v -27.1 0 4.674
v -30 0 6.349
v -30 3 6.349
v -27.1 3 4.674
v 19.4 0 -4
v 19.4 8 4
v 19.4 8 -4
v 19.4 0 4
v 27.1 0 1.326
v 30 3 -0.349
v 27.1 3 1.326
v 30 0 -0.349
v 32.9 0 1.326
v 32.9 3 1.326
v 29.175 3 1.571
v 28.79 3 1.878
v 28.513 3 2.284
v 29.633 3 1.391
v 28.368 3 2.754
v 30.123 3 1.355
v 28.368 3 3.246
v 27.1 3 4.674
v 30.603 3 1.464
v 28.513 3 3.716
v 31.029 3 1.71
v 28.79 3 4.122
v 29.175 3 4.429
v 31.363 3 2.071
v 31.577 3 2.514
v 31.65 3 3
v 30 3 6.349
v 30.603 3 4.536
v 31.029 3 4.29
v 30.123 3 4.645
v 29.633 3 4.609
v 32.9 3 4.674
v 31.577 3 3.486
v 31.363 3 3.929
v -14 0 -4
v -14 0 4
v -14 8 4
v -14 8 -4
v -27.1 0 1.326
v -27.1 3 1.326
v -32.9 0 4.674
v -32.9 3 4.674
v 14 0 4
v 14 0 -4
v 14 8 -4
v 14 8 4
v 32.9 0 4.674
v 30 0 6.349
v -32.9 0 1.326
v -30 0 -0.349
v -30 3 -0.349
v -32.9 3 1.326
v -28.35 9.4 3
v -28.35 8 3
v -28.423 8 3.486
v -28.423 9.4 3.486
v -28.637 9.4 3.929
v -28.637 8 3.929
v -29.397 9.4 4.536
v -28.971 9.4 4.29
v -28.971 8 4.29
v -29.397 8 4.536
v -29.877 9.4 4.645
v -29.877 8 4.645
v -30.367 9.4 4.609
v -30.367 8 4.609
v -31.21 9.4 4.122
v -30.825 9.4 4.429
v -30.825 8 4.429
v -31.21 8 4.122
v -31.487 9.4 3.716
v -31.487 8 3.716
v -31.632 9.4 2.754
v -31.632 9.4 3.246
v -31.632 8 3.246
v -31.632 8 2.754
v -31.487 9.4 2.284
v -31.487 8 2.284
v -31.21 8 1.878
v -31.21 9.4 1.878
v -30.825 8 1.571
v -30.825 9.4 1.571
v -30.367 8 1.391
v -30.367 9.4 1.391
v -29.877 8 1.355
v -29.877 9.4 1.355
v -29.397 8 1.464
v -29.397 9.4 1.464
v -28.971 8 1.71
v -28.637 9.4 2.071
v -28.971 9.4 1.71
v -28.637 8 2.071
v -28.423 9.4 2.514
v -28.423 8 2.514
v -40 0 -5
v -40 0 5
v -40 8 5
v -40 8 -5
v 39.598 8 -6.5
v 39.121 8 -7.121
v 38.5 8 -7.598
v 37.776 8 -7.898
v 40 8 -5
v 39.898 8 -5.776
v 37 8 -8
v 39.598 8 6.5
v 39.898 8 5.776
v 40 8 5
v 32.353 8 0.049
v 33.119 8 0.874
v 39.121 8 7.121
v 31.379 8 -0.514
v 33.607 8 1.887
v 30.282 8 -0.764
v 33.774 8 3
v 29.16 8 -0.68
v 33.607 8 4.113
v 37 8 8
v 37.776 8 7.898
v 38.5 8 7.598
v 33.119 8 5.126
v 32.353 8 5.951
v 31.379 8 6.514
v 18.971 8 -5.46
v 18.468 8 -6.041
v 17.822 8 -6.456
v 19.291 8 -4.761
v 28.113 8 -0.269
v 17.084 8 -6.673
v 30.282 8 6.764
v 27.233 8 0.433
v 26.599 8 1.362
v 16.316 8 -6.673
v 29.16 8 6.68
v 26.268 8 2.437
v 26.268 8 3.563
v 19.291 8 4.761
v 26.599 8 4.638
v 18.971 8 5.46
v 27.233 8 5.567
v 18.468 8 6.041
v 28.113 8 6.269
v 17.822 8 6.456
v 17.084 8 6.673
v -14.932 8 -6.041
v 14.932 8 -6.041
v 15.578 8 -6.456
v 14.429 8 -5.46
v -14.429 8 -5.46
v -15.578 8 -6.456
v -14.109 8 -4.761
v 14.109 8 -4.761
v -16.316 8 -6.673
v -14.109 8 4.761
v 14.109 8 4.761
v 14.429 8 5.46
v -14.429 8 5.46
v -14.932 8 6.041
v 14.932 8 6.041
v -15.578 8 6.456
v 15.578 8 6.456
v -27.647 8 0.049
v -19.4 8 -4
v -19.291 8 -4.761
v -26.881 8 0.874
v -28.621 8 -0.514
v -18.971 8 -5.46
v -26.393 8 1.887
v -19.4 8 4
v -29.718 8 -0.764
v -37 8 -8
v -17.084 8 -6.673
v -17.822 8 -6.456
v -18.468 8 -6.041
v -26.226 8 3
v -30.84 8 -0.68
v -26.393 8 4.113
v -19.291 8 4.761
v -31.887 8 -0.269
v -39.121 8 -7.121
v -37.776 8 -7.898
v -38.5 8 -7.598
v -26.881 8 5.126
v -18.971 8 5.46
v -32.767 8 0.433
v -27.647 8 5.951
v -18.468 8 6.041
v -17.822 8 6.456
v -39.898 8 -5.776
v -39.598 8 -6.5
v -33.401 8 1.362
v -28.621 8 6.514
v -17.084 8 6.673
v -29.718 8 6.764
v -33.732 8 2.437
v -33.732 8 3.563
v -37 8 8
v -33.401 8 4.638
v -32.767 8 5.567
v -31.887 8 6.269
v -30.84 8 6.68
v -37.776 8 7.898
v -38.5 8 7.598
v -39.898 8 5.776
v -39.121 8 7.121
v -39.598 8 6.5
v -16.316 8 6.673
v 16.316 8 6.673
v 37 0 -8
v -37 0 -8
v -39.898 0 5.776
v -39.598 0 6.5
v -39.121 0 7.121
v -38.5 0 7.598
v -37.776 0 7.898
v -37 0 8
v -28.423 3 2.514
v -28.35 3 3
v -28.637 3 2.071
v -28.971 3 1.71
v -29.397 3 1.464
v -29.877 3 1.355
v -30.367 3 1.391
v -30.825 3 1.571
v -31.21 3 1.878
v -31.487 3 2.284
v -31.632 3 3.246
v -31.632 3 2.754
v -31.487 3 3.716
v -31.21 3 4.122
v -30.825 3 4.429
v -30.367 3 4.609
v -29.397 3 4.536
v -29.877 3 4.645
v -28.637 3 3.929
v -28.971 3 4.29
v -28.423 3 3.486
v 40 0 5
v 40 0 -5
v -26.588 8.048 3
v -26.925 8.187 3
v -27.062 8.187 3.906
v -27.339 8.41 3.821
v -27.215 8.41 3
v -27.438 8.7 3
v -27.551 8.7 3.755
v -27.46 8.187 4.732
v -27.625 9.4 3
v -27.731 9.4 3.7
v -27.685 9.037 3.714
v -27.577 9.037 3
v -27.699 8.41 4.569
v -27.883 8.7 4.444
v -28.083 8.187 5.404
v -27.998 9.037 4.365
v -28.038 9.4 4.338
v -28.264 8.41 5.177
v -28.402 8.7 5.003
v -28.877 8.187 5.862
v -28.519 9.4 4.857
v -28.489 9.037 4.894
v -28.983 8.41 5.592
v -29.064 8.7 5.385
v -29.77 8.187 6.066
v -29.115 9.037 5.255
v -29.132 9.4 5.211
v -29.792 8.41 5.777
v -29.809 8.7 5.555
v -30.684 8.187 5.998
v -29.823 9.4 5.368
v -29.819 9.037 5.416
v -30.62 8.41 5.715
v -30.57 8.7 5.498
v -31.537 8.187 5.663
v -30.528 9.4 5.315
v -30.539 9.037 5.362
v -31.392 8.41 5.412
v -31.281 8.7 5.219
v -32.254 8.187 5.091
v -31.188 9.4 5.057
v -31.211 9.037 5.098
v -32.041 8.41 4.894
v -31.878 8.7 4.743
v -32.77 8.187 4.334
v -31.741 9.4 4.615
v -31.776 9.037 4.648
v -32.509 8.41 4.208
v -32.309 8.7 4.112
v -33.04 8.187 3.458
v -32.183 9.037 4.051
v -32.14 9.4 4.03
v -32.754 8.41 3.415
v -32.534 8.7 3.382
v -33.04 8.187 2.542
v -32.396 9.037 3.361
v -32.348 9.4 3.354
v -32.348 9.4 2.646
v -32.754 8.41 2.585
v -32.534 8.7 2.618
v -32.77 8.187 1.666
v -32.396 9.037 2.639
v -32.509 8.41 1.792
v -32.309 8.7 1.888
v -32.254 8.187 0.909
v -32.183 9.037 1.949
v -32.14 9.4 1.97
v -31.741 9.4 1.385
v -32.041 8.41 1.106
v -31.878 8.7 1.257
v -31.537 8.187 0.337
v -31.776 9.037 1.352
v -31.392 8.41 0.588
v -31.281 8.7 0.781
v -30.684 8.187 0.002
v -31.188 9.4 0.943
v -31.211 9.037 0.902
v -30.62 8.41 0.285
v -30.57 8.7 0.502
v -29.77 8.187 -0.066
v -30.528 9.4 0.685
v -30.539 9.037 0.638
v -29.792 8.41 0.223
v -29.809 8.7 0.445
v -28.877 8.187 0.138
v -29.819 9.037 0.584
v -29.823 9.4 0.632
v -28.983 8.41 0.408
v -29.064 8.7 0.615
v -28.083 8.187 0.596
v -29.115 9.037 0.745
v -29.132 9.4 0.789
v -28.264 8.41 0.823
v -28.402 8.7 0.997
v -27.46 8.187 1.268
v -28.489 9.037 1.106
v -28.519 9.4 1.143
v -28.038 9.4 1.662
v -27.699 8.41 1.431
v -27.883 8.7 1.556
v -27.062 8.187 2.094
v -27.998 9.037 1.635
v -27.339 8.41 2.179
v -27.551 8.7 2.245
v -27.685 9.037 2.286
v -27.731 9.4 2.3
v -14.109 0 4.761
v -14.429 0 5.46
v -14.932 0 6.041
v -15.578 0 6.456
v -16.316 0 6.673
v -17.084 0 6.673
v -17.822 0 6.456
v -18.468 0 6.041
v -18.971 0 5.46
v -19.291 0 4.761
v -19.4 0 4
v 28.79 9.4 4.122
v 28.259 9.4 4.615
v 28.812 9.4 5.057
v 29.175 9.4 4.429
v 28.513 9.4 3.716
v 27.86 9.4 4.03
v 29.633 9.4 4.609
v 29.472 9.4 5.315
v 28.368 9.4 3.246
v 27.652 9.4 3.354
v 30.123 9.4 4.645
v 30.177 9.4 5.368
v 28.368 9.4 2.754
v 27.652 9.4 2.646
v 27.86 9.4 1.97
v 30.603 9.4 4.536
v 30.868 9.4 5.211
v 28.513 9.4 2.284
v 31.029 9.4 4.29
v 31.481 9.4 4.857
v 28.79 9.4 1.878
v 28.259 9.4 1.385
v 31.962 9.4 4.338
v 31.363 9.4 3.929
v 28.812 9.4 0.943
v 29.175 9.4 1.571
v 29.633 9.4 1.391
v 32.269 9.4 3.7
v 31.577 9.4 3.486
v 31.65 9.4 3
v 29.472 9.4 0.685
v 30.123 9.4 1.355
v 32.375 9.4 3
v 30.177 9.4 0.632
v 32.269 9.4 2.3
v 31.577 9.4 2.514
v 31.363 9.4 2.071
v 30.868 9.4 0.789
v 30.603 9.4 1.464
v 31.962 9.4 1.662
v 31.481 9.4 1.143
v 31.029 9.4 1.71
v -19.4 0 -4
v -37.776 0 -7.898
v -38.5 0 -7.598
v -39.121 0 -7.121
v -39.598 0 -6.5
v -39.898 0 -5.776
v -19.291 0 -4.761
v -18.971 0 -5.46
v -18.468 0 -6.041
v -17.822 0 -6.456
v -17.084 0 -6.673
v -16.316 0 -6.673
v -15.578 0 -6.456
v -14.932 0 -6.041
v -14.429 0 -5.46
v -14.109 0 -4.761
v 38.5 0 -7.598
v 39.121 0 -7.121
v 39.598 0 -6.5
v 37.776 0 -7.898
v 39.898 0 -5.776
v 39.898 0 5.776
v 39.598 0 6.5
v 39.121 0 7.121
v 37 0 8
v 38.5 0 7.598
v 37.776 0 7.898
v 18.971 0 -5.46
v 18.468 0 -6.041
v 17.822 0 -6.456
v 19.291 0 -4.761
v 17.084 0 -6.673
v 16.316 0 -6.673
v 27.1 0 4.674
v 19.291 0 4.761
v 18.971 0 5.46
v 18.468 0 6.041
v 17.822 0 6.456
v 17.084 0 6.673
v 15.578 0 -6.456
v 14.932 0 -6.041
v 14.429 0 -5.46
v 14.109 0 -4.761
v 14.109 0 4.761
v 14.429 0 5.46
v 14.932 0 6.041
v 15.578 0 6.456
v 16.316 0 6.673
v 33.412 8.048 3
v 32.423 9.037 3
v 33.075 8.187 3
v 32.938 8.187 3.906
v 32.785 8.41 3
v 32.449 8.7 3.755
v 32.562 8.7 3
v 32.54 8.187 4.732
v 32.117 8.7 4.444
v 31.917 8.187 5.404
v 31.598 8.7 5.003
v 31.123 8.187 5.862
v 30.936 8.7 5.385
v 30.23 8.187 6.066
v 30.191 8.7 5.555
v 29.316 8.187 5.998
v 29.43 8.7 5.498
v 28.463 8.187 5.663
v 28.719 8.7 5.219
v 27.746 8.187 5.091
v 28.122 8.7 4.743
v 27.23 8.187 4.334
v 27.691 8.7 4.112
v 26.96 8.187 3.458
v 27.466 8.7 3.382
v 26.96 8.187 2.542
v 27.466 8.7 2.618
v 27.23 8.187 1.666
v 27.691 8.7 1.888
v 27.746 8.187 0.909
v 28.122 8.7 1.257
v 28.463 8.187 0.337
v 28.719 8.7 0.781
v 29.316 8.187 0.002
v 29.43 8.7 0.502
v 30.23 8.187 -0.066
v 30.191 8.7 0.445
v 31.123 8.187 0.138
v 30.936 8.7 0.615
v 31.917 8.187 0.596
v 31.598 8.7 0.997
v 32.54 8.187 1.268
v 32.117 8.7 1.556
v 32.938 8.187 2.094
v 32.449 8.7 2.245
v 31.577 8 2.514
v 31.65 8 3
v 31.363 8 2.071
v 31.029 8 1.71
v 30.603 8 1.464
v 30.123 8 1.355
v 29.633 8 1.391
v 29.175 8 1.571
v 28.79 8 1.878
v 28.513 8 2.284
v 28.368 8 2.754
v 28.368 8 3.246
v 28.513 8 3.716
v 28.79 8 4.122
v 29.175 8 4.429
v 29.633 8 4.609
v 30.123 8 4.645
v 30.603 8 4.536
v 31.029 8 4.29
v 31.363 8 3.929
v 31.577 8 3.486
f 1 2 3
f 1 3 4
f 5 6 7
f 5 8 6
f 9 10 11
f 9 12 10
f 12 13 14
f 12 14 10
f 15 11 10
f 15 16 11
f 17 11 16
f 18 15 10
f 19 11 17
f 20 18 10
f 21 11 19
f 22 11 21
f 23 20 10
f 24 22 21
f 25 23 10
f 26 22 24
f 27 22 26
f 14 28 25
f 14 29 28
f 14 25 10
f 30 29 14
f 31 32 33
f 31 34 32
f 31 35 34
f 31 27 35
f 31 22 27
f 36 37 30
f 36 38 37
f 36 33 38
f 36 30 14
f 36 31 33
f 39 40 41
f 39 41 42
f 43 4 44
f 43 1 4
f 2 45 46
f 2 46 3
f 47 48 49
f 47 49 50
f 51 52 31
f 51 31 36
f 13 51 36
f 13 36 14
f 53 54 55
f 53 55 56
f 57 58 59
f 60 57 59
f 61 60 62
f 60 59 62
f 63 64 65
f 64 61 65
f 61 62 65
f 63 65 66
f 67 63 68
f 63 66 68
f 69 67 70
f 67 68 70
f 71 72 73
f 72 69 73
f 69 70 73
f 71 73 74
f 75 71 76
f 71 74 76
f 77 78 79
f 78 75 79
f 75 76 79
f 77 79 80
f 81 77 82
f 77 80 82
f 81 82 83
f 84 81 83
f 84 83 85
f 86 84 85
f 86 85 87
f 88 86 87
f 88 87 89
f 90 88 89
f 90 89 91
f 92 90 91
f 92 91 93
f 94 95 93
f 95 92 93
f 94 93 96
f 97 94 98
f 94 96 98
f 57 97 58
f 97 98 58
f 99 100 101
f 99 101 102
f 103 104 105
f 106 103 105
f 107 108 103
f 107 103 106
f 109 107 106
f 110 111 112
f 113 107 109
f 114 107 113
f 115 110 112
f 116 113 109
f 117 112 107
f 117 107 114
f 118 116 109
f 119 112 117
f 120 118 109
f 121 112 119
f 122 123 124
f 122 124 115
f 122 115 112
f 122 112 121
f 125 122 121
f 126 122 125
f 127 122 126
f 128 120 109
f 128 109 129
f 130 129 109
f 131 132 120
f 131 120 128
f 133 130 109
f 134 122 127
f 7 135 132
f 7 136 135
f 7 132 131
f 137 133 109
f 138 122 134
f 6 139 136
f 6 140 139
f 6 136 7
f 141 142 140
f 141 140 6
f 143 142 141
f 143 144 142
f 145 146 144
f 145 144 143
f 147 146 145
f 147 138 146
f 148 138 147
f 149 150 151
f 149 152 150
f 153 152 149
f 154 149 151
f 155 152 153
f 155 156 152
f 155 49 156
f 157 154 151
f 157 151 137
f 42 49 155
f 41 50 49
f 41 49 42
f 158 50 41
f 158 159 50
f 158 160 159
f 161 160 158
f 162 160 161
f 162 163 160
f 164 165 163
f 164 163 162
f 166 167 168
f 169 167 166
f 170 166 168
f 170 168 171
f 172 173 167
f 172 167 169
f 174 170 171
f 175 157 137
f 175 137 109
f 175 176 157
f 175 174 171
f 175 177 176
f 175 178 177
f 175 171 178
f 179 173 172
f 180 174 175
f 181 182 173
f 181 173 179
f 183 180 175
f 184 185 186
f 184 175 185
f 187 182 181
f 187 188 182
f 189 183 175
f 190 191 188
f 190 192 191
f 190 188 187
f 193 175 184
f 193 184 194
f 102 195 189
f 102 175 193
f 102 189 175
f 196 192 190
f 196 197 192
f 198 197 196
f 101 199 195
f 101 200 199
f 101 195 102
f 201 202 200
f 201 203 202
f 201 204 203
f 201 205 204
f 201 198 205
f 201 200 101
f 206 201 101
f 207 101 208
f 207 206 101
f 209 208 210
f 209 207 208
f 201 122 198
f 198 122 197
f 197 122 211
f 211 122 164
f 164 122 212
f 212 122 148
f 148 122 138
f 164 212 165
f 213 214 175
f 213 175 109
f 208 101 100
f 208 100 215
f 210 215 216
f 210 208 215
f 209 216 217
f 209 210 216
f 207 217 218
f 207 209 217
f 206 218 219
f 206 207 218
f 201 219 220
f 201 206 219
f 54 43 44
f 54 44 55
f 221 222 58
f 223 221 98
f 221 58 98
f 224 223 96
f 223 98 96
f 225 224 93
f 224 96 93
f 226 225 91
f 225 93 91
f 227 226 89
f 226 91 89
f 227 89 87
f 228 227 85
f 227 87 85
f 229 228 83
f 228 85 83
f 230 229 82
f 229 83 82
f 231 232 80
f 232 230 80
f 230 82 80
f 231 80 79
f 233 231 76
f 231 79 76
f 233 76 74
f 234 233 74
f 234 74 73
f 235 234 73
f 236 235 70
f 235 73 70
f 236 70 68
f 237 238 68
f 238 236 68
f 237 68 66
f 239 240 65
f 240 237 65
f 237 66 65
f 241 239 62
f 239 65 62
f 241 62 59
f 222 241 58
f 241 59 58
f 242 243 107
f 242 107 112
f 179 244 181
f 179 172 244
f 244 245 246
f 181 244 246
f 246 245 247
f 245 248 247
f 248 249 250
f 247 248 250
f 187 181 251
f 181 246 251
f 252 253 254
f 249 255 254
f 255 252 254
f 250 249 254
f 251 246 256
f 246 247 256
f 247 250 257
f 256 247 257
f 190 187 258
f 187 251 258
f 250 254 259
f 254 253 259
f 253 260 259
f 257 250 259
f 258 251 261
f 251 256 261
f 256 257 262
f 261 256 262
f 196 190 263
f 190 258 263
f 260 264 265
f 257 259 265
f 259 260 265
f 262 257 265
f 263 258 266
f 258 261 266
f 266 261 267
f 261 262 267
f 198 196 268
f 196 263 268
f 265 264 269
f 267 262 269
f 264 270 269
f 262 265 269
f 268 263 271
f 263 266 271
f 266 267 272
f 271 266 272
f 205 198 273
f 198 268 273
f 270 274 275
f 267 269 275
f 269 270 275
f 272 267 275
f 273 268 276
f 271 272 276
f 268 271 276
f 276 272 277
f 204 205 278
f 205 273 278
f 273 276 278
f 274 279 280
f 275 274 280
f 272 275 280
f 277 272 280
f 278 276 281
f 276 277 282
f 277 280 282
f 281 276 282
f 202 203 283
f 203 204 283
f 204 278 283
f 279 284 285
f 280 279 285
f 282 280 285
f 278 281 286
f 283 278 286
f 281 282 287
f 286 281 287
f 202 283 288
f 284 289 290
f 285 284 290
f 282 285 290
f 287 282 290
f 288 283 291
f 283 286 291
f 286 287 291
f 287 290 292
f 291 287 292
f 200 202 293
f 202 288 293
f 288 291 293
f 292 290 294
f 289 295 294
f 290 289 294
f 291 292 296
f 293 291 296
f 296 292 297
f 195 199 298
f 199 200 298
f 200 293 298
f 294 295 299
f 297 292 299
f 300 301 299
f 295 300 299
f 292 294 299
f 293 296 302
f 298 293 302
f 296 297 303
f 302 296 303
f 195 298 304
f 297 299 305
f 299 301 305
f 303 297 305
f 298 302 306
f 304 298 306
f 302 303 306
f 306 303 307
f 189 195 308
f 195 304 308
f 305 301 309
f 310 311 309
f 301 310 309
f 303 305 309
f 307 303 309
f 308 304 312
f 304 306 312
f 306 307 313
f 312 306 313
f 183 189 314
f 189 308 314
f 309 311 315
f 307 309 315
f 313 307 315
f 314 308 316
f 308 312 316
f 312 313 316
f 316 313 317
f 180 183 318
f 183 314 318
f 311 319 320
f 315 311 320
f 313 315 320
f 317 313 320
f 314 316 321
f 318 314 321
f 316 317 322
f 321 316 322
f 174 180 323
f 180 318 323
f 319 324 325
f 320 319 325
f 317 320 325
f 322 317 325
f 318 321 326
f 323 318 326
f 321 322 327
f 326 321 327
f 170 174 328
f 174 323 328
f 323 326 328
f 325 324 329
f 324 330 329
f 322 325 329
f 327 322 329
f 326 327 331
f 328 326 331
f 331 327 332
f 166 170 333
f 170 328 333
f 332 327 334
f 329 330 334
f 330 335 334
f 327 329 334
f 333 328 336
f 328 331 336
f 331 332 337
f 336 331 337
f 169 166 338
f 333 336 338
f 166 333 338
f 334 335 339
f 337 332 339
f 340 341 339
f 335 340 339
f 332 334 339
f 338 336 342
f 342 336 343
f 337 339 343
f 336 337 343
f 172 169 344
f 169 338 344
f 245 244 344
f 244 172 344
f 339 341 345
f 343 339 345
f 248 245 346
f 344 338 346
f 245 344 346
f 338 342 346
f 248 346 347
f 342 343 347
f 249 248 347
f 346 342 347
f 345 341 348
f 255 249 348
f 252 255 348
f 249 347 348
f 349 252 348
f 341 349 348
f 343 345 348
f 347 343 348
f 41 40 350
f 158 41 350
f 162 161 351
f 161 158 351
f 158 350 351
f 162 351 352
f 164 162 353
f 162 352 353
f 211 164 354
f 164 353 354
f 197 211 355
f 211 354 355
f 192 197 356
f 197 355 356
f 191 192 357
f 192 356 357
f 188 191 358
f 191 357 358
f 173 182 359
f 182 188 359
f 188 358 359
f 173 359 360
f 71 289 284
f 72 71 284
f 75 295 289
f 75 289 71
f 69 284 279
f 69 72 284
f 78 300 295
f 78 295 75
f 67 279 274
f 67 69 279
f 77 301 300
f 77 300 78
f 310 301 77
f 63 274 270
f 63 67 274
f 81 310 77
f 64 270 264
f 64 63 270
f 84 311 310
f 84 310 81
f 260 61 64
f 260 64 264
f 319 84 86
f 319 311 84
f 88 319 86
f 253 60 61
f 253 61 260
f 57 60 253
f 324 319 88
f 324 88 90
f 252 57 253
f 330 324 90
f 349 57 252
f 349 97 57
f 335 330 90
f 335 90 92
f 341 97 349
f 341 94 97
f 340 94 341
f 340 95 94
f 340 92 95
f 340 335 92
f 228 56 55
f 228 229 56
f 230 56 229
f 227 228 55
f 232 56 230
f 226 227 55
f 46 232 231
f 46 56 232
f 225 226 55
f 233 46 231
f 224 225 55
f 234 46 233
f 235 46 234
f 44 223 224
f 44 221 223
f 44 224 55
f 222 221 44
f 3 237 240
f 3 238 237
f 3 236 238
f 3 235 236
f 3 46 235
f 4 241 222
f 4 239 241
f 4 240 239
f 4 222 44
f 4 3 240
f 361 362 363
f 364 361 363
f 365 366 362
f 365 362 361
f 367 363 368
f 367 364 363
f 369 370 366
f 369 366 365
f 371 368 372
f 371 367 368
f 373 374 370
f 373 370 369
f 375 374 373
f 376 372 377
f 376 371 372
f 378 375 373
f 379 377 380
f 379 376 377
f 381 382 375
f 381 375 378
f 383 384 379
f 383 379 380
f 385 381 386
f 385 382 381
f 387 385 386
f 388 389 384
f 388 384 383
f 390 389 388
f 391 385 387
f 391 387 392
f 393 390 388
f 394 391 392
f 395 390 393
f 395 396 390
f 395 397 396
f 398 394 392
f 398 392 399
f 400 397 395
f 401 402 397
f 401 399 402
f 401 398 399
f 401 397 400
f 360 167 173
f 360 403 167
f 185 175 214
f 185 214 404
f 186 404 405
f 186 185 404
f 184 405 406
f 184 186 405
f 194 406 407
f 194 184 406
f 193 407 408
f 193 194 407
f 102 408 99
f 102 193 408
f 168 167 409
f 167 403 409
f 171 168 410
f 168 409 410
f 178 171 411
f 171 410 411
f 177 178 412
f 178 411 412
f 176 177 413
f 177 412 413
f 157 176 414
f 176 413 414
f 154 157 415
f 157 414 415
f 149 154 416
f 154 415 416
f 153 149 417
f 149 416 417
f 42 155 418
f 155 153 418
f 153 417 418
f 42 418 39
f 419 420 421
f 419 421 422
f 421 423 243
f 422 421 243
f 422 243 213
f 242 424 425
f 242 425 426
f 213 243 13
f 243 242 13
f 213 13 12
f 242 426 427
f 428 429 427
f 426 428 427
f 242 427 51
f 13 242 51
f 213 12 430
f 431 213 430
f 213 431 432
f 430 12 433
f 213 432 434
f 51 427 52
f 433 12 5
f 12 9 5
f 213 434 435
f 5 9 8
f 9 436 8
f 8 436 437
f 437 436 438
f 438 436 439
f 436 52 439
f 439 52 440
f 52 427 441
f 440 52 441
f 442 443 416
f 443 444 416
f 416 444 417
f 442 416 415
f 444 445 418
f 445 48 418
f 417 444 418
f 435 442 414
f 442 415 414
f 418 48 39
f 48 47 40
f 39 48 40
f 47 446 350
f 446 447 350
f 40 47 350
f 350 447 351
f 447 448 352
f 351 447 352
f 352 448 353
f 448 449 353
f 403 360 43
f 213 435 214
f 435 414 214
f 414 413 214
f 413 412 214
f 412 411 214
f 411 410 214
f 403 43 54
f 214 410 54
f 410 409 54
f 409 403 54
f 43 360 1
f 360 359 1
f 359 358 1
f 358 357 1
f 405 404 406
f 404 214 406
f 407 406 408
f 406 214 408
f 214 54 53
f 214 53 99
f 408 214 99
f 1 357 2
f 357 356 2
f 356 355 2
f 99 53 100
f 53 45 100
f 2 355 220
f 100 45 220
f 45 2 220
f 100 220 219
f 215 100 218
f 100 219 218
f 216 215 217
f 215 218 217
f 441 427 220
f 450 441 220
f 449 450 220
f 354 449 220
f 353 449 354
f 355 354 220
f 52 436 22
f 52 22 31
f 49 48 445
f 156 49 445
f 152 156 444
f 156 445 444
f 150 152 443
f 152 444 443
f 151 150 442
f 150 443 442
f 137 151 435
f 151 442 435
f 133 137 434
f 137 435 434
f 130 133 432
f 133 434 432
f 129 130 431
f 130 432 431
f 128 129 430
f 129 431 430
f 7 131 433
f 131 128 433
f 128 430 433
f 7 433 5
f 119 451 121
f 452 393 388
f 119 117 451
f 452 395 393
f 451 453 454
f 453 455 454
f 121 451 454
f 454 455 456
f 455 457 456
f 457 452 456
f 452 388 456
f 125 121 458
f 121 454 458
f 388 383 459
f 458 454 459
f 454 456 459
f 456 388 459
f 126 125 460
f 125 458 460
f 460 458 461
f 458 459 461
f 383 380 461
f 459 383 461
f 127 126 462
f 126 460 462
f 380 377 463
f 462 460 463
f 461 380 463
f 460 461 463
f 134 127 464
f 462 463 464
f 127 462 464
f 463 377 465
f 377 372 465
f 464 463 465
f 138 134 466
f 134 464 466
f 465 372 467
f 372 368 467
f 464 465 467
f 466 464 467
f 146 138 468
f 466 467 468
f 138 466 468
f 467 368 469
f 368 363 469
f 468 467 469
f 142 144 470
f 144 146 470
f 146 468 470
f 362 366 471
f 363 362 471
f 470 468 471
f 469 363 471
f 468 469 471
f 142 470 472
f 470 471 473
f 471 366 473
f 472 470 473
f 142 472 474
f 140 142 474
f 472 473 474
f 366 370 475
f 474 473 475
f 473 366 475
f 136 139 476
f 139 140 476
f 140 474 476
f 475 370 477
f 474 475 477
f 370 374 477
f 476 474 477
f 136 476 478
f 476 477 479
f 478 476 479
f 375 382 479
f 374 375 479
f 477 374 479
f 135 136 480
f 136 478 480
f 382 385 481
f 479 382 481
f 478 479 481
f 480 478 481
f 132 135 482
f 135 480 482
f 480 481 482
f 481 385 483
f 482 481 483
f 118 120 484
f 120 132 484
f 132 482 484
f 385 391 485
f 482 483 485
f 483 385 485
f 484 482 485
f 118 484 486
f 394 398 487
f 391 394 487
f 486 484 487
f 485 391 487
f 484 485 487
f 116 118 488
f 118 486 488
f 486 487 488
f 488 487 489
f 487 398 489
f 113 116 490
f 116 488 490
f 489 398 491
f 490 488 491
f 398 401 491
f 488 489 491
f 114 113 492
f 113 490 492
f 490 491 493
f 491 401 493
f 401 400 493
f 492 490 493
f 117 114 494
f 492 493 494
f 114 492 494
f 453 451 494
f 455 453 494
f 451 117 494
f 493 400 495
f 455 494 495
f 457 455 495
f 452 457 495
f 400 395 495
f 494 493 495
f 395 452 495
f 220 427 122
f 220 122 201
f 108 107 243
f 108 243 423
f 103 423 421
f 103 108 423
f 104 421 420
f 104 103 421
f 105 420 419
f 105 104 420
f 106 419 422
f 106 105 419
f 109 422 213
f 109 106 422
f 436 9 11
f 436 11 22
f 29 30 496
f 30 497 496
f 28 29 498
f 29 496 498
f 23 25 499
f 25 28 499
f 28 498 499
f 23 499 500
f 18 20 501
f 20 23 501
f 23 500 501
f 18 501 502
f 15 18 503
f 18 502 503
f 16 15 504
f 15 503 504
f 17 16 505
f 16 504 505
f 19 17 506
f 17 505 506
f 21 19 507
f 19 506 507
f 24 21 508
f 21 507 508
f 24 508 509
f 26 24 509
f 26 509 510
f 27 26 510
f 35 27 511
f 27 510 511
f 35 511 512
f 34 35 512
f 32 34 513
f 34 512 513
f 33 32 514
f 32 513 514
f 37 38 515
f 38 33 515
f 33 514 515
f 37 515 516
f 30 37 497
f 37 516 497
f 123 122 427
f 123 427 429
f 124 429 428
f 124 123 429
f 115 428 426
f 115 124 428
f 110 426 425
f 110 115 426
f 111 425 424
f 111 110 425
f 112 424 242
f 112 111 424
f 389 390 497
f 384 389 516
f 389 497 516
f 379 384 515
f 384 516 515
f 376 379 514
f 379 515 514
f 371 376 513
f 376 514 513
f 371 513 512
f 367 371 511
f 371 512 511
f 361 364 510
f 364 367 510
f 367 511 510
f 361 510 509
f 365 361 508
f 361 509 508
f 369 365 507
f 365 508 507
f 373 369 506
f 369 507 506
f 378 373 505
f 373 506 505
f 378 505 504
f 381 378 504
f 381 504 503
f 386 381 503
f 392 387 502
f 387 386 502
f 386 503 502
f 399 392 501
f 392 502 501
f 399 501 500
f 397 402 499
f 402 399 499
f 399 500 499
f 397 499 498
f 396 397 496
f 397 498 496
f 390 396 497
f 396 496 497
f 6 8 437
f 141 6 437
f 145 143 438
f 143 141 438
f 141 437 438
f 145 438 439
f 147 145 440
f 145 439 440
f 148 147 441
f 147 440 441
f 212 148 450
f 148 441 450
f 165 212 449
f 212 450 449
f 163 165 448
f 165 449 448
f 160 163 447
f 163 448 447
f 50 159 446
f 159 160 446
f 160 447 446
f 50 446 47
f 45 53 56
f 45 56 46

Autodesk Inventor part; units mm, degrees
ref_plane "YZ Plane" through (0, 0, 0) normal (1, 0, 0) x (0, 1, 0)
ref_plane "XZ Plane" through (0, 0, 0) normal (0, 1, 0) x (-1, 0, 0)
ref_plane "XY Plane" through (0, 0, 0) normal (0, 0, 1) x (1, 0, 0)
sketch "Boceto1" plane through (0, 0, 0) normal (0, 1, 0) x (-1, 0, 0)
  line L0 (-40, 8) -> (40, 8)
  line L1 (40, 8) -> (40, -8)
  line L2 (40, -8) -> (-40, -8)
  line L3 (-40, -8) -> (-40, 8)
  line L4 (-40, 8) -> (40, -8) construction
  line L5 (40, 8) -> (-40, -8) construction
  circle A0 centre (-16.7, 4) radius 2.7
  circle A1 centre (-16.7, -4) radius 2.7
  circle A2 centre (16.7, 4) radius 2.7
  circle A3 centre (16.7, -4) radius 2.7
  line L6 (19.4, 4) -> (14, 4)
  line L7 (14, 4) -> (14, -4)
  line L8 (14, -4) -> (19.4, -4)
  line L9 (19.4, -4) -> (19.4, 4)
  line L10 (-14, 4) -> (-19.4, 4)
  line L11 (-19.4, 4) -> (-19.4, -4)
  line L12 (-19.4, -4) -> (-14, -4)
  line L13 (-14, -4) -> (-14, 4)
  point P0 (0, 0)
  point P1 (16.7, -4)
  point P2 (16.7, 4)
  point P3 (-16.7, -4)
  point P4 (-16.7, 4)
  point P5 (19.4, -4)
  point P6 (-14, -4)
  point P7 (-19.4, -4)
  point P8 (-19.4, 4)
  dimension "d2" = 5.4
  dimension "d0" = 80
  dimension "d1" = 16
  dimension "d3" = 4
  dimension "d4" = 8
  dimension "d5" = 23.3
  dimension "d35" = 23.3
extrude "Extrusión1" add sketch "Boceto1" along normal blind 8
fillet "Empalme2" radius 3 4 edges at (-40, 4, 8) (-40, 4, -8) (40, 4, 8) (40, 4, -8)
sketch "Boceto6" plane through (0, 8, 0) normal (0, 1, 0) x (1, 0, 0)
  circle A0 centre (-30, -3) radius 1.65
  circle A1 centre (30, -3) radius 1.65
  line L0 (37, 8) -> (-37, 8) projected
  line L1 (30, -3) -> (-30, -3)
  line L2 (-37, -8) -> (37, -8) projected
  point P0 (0, 0)
  dimension "d27" = 3.3
  dimension "d48" = 11
  dimension "d51" = 60
  dimension "d52" = 30
extrude "Extrusión6" cut sketch "Boceto6" against normal through all
sketch "Boceto11" plane through (0, 0, 0) normal (0, -1, 0) x (1, 0, 0)
  circle A0 centre (-30, 3) radius 1.65 projected
  circle A1 centre (-30, 3) radius 2.9
  circle A2 centre (30, 3) radius 1.65 projected
  circle A3 centre (30, 3) radius 2.9
  line L0 (-32.9, 4.6743) -> (-30, 6.3486)
  line L1 (-30, 6.3486) -> (-27.1, 4.6743)
  line L2 (-27.1, 4.6743) -> (-27.1, 1.3257)
  line L3 (-27.1, 1.3257) -> (-30, -0.3486)
  line L4 (-30, -0.3486) -> (-32.9, 1.3257)
  line L5 (-32.9, 1.3257) -> (-32.9, 4.6743)
  line L6 (30, -0.3486) -> (27.1, 1.3257)
  line L7 (27.1, 1.3257) -> (27.1, 4.6743)
  line L8 (27.1, 4.6743) -> (30, 6.3486)
  line L9 (30, 6.3486) -> (32.9, 4.6743)
  line L10 (32.9, 4.6743) -> (32.9, 1.3257)
  line L11 (32.9, 1.3257) -> (30, -0.3486)
  point P0 (0, 0)
  dimension "d45" = 5.8
extrude "Extrusión10" cut sketch "Boceto11" against normal blind 3 contours A0 | A1 | L2 L3 A1 | A1 L1 L2 | A1 L0 L1 | L3 L4 A1 | A1 L5 L0 | L4 L5 A1 | A2 | A3 | L10 L11 A3 | A3 L9 L10 | A3 L8 L9 | L11 L6 A3 | A3 L7 L8 | L6 L7 A3
sketch "Boceto12" plane through (0, 8, 0) normal (0, 1, 0) x (1, 0, 0)
  circle A0 centre (-30, -3) radius 1.65 projected
  circle A1 centre (-30, -3) radius 2.375
  circle A2 centre (30, -3) radius 1.65 projected
  circle A3 centre (30, -3) radius 2.375
  point P0 (0, 0)
  dimension "d53" = 4.75
  dimension "d54" = 4.75
extrude "Extrusión11" add sketch "Boceto12" along normal blind 1.4
fillet "Empalme3" radius 1.4 2 edges at (-32.375, 8, 3) (27.625, 8, 3)
sketch "Boceto5" plane through (0, 0, 0) normal (0, -1, 0) x (1, 0, 0)
  circle A0 centre (-30, -4.1) radius 1.7 projected
  circle A1 centre (-30, -4.1) radius 2.875
  circle A2 centre (20, -4.1) radius 1.7 projected
  circle A3 centre (20, -4.1) radius 2.875
  line L0 (-33.3198, -4.1) -> (-31.6599, -1.225)
  line L1 (-31.6599, -1.225) -> (-28.3401, -1.225)
  line L2 (-28.3401, -1.225) -> (-26.6802, -4.1)
  line L3 (-26.6802, -4.1) -> (-28.3401, -6.975)
  line L4 (-28.3401, -6.975) -> (-31.6599, -6.975)
  line L5 (-31.6599, -6.975) -> (-33.3198, -4.1)
  line L6 (16.6802, -4.1) -> (18.3401, -1.225)
  line L7 (18.3401, -1.225) -> (21.6599, -1.225)
  line L8 (21.6599, -1.225) -> (23.3198, -4.1)
  line L9 (23.3198, -4.1) -> (21.6599, -6.975)
  line L10 (21.6599, -6.975) -> (18.3401, -6.975)
  line L11 (18.3401, -6.975) -> (16.6802, -4.1)
  point P0 (0, 0)
  dimension "d24" = 5.75
properties part number "Rack support"
